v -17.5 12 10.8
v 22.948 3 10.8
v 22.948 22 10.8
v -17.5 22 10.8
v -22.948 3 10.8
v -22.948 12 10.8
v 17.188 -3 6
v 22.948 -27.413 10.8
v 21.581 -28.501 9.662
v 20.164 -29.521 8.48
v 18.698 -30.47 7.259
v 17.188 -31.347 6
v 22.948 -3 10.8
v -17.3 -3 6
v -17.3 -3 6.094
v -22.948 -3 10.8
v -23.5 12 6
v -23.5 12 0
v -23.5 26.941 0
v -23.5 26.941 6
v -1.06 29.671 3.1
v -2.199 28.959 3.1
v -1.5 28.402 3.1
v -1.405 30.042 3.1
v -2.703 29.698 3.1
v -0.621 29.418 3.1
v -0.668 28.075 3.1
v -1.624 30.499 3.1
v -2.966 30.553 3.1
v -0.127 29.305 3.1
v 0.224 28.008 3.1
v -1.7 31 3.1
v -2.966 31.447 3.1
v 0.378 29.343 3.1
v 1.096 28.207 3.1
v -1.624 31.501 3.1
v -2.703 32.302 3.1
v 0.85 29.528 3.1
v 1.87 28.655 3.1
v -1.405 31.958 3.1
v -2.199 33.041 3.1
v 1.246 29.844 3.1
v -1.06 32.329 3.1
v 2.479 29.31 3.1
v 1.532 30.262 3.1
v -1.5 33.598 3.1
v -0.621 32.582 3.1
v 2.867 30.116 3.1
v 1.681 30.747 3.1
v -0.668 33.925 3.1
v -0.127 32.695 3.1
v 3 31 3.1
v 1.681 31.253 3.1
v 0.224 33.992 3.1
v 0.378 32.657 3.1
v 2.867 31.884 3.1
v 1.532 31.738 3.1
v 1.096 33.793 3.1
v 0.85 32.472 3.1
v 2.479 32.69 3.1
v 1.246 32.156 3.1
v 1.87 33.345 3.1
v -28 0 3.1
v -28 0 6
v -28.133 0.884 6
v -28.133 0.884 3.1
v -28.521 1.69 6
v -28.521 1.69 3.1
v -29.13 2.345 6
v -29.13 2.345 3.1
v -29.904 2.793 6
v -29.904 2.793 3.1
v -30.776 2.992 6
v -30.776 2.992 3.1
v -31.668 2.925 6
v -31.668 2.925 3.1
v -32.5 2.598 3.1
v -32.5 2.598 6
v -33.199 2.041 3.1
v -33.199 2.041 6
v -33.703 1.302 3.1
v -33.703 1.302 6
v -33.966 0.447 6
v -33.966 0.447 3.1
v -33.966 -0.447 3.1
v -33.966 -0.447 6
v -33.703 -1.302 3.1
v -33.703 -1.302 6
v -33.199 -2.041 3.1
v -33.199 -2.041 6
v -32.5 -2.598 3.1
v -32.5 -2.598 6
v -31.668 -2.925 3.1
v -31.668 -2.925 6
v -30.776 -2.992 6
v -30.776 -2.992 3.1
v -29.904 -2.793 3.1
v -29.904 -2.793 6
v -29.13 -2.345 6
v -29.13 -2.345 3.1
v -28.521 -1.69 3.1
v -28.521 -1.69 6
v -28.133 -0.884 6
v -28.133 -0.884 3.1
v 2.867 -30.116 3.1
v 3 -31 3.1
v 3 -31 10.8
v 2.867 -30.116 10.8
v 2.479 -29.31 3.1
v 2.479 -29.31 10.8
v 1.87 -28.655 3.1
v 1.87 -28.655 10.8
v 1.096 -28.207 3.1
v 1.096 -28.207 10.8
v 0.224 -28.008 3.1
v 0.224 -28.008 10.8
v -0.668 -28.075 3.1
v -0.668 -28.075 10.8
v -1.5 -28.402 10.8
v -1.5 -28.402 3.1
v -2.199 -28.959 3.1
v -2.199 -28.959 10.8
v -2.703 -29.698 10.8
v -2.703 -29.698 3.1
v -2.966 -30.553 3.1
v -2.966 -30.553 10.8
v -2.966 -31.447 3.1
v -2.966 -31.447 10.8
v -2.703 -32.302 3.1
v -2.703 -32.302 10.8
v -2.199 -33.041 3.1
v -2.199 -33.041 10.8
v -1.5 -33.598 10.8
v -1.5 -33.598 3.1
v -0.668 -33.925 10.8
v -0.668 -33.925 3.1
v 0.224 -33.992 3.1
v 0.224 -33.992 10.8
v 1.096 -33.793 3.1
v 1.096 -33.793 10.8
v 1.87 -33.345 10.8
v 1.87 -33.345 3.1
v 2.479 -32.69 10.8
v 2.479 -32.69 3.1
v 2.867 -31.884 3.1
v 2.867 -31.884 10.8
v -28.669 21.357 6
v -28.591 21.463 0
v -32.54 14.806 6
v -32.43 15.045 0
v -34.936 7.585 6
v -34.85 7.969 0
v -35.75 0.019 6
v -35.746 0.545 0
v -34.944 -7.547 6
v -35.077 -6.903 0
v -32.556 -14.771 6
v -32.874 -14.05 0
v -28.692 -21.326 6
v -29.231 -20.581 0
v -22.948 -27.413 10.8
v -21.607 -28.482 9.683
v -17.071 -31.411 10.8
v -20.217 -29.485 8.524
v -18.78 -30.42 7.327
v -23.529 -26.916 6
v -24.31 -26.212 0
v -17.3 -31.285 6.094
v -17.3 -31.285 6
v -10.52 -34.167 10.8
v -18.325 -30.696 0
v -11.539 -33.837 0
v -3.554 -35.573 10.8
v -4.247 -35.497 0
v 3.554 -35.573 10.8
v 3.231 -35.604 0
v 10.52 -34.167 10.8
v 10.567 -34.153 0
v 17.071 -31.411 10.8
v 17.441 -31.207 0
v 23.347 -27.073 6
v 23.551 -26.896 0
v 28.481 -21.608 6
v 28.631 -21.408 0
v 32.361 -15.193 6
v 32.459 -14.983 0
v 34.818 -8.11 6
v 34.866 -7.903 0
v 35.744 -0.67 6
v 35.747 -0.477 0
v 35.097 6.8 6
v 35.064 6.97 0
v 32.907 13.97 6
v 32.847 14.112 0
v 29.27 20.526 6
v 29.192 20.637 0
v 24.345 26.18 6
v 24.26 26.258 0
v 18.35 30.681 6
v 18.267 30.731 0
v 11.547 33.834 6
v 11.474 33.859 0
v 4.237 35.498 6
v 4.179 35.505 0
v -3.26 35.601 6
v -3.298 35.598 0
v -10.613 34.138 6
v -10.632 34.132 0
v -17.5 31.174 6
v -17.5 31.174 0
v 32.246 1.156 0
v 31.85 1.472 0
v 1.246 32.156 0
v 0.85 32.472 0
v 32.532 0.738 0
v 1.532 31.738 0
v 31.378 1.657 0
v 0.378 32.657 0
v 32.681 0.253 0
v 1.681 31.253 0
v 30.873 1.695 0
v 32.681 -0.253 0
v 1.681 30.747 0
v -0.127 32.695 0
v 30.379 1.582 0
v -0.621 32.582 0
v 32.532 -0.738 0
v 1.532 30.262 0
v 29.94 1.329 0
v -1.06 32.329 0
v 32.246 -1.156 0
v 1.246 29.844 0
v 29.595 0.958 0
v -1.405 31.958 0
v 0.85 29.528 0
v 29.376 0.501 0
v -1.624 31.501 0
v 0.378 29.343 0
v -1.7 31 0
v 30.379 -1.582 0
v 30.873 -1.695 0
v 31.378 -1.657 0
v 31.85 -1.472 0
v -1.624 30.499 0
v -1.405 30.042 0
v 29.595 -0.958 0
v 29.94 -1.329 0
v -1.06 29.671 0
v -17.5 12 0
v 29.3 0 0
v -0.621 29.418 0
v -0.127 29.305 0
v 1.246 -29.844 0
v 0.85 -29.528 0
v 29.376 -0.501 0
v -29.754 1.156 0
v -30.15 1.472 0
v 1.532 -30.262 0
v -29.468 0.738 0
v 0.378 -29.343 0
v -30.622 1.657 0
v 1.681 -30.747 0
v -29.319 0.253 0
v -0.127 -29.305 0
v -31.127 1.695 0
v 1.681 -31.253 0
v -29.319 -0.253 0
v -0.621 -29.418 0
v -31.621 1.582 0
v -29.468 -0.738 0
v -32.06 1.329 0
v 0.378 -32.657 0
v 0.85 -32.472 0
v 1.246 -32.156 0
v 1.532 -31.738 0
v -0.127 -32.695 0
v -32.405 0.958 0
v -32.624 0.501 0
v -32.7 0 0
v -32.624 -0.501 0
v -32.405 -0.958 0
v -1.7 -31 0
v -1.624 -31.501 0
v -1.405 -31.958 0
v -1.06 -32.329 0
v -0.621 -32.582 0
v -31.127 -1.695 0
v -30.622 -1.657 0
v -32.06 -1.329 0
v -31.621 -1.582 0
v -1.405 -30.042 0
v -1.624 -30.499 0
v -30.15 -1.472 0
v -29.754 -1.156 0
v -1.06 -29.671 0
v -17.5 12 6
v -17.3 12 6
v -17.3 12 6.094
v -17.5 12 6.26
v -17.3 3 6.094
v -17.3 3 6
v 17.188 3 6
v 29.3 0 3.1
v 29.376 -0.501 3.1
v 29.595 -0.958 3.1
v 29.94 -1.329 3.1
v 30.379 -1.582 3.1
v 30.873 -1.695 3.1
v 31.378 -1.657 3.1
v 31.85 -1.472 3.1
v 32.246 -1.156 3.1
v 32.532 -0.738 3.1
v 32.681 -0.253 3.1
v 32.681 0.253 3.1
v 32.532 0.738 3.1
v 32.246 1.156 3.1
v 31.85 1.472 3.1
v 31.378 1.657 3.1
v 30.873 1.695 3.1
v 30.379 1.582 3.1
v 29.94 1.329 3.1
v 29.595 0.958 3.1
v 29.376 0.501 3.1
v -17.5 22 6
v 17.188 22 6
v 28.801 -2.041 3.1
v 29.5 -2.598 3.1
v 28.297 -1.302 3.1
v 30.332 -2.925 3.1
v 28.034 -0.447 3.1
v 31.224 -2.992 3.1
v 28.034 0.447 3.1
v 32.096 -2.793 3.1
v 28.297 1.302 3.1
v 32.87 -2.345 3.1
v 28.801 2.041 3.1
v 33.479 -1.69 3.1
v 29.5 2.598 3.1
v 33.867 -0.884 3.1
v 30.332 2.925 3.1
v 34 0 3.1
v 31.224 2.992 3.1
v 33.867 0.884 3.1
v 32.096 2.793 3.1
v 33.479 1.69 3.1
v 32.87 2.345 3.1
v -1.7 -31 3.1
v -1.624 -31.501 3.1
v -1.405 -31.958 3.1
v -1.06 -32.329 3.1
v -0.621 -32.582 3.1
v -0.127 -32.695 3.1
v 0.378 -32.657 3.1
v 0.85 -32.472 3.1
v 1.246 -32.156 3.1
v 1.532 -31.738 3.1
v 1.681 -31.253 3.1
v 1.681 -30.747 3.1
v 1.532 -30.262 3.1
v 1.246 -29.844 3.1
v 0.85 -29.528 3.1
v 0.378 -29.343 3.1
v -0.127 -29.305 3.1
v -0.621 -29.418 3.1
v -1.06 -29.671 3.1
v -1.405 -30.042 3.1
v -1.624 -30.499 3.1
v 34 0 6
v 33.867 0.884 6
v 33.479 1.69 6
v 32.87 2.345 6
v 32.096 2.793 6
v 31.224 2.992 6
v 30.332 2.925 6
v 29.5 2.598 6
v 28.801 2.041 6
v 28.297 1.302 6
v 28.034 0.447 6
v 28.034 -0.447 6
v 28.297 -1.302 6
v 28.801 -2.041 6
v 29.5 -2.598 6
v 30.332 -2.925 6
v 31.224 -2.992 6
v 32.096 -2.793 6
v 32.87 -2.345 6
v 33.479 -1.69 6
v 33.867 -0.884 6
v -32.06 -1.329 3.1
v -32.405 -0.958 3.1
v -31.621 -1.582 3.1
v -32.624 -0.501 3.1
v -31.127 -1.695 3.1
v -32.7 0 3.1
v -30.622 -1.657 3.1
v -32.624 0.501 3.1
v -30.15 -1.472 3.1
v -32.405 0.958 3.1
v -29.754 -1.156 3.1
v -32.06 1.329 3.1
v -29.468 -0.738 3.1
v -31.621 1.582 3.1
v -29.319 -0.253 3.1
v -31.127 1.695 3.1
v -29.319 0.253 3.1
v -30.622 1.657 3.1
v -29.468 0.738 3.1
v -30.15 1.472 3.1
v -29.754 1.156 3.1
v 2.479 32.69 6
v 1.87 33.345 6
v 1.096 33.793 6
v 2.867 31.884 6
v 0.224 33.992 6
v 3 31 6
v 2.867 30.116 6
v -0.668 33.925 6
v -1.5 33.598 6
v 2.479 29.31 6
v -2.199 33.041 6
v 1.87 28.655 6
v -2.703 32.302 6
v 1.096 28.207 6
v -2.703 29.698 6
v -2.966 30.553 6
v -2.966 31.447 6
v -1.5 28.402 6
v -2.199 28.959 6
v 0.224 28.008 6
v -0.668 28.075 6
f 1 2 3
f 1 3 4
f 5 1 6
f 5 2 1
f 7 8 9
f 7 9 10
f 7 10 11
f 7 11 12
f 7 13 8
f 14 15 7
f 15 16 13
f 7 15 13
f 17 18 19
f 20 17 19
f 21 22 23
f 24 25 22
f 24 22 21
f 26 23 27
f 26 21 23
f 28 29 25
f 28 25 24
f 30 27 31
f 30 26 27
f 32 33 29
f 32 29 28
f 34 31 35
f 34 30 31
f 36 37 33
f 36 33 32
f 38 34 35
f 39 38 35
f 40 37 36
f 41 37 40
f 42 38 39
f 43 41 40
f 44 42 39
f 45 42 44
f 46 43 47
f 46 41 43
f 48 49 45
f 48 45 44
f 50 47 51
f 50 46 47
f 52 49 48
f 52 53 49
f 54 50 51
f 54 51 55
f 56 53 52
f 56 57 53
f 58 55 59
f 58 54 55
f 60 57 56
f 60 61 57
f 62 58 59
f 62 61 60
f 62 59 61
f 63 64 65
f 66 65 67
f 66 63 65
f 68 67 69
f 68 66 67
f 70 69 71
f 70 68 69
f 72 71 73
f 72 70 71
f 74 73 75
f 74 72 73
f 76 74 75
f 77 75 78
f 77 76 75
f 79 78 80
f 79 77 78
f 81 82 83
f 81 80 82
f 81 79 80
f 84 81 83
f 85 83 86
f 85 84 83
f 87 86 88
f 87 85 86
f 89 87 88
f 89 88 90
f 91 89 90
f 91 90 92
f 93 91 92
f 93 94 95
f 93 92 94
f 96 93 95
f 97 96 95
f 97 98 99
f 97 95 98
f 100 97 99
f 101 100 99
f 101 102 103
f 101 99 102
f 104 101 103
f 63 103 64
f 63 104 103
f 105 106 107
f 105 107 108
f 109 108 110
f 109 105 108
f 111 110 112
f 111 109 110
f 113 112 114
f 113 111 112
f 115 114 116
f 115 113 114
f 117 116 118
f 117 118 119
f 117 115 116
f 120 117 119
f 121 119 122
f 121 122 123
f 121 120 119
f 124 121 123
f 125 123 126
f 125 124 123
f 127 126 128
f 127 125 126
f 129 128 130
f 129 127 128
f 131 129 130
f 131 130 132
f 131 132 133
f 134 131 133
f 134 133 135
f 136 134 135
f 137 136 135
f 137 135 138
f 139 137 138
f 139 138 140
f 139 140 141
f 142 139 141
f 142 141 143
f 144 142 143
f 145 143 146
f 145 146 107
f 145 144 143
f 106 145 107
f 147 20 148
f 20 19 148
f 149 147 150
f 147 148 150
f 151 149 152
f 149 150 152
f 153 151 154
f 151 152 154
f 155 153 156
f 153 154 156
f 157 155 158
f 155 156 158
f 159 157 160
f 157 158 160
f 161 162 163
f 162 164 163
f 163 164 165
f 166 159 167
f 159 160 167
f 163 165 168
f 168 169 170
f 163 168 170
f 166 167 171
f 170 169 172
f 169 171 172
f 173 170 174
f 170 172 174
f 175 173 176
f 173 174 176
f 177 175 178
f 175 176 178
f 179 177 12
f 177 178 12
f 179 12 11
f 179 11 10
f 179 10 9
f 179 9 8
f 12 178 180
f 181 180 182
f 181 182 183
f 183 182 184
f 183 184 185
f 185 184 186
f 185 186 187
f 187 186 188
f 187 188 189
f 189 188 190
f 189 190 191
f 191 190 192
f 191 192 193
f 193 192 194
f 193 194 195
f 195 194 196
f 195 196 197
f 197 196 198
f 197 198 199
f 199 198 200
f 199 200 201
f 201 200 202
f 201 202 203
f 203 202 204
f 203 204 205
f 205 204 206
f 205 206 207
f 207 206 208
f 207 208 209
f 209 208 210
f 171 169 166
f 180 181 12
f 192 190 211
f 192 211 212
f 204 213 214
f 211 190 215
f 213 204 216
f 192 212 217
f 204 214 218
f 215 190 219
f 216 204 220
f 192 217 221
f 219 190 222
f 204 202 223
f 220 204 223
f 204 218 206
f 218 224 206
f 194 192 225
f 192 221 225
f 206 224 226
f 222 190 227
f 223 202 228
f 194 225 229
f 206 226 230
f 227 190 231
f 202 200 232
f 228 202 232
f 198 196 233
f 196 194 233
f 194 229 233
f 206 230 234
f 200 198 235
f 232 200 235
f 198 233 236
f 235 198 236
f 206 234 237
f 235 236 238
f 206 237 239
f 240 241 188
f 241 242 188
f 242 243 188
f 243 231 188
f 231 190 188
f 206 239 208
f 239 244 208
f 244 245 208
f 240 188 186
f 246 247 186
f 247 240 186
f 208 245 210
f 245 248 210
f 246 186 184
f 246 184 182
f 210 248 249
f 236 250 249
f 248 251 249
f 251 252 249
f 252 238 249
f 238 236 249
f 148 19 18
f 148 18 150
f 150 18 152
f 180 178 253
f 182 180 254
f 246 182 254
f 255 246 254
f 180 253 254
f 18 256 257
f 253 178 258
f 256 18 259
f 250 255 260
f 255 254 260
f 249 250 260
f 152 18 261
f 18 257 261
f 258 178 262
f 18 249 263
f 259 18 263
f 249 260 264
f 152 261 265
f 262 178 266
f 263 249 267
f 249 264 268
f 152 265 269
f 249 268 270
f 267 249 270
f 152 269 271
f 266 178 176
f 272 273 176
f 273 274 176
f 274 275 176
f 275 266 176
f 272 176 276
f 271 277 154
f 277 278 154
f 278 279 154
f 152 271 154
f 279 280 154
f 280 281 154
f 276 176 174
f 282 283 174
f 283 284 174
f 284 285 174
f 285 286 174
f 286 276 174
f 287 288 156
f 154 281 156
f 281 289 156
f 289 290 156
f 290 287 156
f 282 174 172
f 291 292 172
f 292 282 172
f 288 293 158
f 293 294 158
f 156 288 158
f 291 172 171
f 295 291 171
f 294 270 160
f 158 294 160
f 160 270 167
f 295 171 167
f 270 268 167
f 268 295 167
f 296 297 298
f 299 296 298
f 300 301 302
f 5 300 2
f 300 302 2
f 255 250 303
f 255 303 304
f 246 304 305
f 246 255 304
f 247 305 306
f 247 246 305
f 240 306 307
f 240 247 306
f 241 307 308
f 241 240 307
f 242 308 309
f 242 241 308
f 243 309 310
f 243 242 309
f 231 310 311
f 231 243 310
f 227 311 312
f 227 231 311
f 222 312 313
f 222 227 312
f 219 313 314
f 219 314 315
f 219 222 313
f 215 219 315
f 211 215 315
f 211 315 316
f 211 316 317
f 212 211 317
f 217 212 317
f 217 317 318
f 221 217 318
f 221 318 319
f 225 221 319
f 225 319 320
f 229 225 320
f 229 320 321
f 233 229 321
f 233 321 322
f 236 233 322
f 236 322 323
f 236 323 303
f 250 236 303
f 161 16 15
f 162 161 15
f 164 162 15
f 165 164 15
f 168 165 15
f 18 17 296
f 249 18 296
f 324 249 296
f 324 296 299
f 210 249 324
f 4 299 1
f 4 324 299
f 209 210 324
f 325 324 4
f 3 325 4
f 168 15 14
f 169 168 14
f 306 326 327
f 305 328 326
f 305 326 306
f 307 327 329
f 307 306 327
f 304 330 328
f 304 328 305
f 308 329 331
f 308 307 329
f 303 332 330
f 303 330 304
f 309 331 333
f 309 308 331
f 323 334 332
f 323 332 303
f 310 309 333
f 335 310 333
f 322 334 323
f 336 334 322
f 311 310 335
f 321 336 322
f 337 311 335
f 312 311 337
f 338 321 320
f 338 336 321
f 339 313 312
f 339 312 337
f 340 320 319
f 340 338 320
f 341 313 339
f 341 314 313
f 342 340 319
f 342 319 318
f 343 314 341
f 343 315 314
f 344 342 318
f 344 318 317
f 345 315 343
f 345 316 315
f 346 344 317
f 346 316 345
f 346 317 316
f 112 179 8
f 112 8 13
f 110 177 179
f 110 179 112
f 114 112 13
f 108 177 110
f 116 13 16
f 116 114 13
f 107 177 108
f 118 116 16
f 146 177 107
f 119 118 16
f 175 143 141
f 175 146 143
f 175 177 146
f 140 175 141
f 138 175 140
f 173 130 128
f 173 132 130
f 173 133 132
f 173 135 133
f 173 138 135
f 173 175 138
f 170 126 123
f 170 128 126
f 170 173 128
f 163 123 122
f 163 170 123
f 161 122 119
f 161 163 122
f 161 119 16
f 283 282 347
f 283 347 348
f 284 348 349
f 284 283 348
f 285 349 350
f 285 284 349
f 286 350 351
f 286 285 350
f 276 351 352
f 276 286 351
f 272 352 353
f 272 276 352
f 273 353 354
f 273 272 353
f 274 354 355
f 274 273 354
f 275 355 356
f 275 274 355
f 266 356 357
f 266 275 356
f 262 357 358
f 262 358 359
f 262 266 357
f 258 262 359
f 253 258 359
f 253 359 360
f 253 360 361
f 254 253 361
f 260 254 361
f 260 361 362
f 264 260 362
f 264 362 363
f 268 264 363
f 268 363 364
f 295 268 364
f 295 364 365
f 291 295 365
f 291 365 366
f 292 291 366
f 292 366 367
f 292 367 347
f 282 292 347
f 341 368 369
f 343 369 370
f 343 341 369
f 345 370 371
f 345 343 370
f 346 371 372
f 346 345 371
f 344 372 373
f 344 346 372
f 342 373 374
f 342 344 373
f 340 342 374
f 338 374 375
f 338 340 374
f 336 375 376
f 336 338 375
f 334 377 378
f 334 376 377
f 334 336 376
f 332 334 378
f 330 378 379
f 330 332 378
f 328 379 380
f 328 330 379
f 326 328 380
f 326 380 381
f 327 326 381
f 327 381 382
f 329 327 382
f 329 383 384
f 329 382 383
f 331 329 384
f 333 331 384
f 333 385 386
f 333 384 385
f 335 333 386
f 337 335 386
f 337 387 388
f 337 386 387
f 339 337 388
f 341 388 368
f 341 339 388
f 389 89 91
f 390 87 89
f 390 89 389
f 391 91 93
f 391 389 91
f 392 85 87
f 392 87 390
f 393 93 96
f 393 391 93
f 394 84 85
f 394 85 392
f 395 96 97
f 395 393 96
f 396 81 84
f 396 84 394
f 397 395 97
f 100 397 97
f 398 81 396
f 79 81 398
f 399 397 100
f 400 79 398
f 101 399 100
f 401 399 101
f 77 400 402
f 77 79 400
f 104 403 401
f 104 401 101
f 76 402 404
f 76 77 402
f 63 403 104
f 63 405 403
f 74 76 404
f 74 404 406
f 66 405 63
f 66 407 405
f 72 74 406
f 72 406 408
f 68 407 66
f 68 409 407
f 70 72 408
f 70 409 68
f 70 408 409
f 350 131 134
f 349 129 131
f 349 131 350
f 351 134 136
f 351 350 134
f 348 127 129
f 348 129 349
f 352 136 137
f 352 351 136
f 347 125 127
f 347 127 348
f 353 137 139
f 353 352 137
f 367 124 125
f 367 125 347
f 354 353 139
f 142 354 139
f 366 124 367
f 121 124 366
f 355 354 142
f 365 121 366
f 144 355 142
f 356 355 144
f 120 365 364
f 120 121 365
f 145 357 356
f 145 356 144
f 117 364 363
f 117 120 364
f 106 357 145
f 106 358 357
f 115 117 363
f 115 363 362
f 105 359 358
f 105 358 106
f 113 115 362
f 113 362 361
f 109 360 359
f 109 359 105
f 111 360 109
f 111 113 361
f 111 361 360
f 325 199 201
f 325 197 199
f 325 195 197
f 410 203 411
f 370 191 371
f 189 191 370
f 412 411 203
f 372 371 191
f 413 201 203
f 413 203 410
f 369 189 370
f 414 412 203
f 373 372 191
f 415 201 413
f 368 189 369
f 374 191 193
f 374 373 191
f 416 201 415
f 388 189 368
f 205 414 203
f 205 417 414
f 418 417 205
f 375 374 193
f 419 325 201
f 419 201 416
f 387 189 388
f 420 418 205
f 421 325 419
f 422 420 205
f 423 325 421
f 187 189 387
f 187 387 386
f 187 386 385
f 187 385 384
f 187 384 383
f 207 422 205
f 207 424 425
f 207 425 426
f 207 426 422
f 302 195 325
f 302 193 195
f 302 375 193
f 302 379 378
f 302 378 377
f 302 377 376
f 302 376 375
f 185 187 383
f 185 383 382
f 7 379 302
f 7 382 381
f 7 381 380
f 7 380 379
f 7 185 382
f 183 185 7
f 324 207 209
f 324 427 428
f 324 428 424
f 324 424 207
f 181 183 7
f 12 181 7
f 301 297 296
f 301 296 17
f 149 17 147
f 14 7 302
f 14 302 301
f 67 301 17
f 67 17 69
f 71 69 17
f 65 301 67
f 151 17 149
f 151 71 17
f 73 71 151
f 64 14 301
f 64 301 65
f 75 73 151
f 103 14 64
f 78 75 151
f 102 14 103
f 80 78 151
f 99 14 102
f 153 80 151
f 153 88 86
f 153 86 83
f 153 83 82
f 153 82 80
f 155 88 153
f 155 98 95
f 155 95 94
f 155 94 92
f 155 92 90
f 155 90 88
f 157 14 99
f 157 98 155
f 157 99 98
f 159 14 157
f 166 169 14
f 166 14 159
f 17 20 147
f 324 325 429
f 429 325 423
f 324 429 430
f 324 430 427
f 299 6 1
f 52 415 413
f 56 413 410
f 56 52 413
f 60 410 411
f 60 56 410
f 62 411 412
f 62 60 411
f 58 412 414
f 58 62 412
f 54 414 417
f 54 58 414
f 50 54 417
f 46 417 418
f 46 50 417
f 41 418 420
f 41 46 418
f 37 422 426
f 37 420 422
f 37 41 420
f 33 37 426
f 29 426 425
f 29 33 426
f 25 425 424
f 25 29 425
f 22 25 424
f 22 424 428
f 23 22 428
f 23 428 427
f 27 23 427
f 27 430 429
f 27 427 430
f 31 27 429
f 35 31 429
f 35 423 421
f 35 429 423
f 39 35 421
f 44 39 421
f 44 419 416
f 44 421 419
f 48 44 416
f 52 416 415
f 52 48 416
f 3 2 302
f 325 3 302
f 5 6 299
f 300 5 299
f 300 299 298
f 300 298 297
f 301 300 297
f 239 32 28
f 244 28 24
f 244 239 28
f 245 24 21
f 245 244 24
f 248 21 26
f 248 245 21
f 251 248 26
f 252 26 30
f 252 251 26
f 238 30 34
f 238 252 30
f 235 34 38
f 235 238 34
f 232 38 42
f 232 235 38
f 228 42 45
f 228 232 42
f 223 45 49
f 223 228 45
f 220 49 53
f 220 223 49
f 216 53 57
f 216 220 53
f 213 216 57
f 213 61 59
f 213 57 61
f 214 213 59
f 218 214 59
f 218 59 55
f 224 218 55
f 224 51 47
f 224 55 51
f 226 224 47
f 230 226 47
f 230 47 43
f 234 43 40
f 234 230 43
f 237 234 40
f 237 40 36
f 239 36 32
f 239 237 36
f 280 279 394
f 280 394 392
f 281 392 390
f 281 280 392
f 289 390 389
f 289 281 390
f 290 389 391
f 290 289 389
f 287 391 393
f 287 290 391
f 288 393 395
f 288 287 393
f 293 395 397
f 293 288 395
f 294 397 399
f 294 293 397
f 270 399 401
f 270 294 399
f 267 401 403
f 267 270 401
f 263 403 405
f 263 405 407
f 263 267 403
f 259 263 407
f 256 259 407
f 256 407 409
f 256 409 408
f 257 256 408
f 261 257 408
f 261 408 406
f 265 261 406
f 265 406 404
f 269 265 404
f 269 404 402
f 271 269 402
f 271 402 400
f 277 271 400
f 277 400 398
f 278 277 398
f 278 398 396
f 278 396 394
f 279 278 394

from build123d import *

# Parameters (mm, degrees)
SKETCH1_R                      = 35.75
SKETCH1_R_2                    = 1.7
BOSS_EXTRUDE1_DEPTH            = 10.8
CUT_EXTRUDE1_START             = -7.7
SKETCH2_R                      = 3
SKETCH2_R_2                    = 1.7
CUT_EXTRUDE1_DEPTH             = 7.7
SKETCH3_W                      = 6
SKETCH3_H                      = 10
CUT_EXTRUDE2_DEPTH             = 52.698791088
CUT_EXTRUDE3_DEPTH             = 52.698791088
CUT_EXTRUDE3_DIRECTION_2_REACH = 53.699
BOSS_EXTRUDE2_DEPTH            = 7.7
CUT_EXTRUDE4_DEPTH             = 66.040487391
CUT_EXTRUDE4_DEPTH_BACK        = 66.040487391
SKETCH6_W                      = 4.8
SKETCH6_H                      = 17.274998913
CUT_EXTRUDE5_DEPTH             = 66.040487391
CUT_EXTRUDE5_DEPTH_BACK        = 66.040487391
SKETCH8_W                      = 6
SKETCH8_H                      = 23.025515334
CUT_EXTRUDE6_DEPTH             = 10


with BuildPart() as part:
    # Sketch1 → Boss-Extrude1 (new body)
    with BuildSketch(Plane.XY):
        with Locations(Location((0, 0, 0), (0, 0, 180))):
            Circle(SKETCH1_R)
        with Locations(Location((0, 31, 0), (0, 0, 180))):
            Circle(SKETCH1_R_2, mode=Mode.SUBTRACT)
        with Locations(Location((31, 0, 0), (0, 0, 180))):
            Circle(SKETCH1_R_2, mode=Mode.SUBTRACT)
        with Locations(Location((0, -31, 0), (0, 0, 180))):
            Circle(SKETCH1_R_2, mode=Mode.SUBTRACT)
        with Locations(Location((-31, 0, 0), (0, 0, 180))):
            Circle(SKETCH1_R_2, mode=Mode.SUBTRACT)
    extrude(amount=BOSS_EXTRUDE1_DEPTH)

    # Sketch2 → Cut-Extrude1 (cut)
    # profile 1 of 4: a face of its own
    with BuildSketch(Plane.XY.offset(10.8).offset(CUT_EXTRUDE1_START)):
        with Locations((-31, 0)):
            Circle(SKETCH2_R)
        with Locations(Location((-31, 0, 0), (0, 0, 180))):
            Circle(SKETCH2_R_2, mode=Mode.SUBTRACT)
    # profile 2 of 4: a face of its own
    with BuildSketch(Plane.XY.offset(10.8).offset(CUT_EXTRUDE1_START)):
        with Locations((31, 0)):
            Circle(SKETCH2_R)
        with Locations(Location((31, 0, 0), (0, 0, 180))):
            Circle(SKETCH2_R_2, mode=Mode.SUBTRACT)
    # profile 3 of 4: a face of its own
    with BuildSketch(Plane.XY.offset(10.8).offset(CUT_EXTRUDE1_START)):
        with Locations((0, -31)):
            Circle(SKETCH2_R)
        with Locations(Location((0, -31, 0), (0, 0, 180))):
            Circle(SKETCH2_R_2, mode=Mode.SUBTRACT)
    # profile 4 of 4: a face of its own
    with BuildSketch(Plane.XY.offset(10.8).offset(CUT_EXTRUDE1_START)):
        with Locations((0, 31)):
            Circle(SKETCH2_R)
    extrude(amount=CUT_EXTRUDE1_DEPTH, mode=Mode.SUBTRACT)

    # Sketch3 → Cut-Extrude2 (cut, through all)
    with BuildSketch(Plane.XY.offset(10.8)):
        with Locations((-20.5, 17)):
            Rectangle(SKETCH3_W, SKETCH3_H)
    extrude(amount=-CUT_EXTRUDE2_DEPTH, mode=Mode.SUBTRACT)

    # Sketch4 → Cut-Extrude3 (cut)
    with BuildSketch(Plane(origin=(0, 0, 0), x_dir=(1, 0, 0), z_dir=(0, 1, 0))):
        Polygon((35.75, -6), (17.3, -6), (23.06, -10.8), (35.75, -10.8), align=None)
        Polygon((23.06, -10.8), (22.947590013, -10.8), (17.187590013, -6), (17.3, -6), align=None)
        Polygon((-23.26, -10.8), (-17.5, -6), (-35.75, -6), (-35.75, -10.8), align=None)
        Polygon((-23.06, -10.8), (-17.3, -6), (-17.5, -6), (-23.26, -10.8), align=None)
        Polygon((-17.3, -6.093674989), (-17.3, -6), (-23.06, -10.8), (-22.947590013, -10.8), align=None)
    extrude(amount=-CUT_EXTRUDE3_DEPTH, mode=Mode.SUBTRACT)

    # Cut-Extrude3 direction 2: up to this face of the body (flat: up to its plane)
    cut_extrude3_direction_2_end = Plane(part.part.faces().sort_by_distance((-20.5, 22, 5.4))[0])
    # Sketch4 → Cut-Extrude3 direction 2 (cut, up to the picked face)
    with BuildSketch(Plane(origin=(0, 0, 0), x_dir=(1, 0, 0), z_dir=(0, 1, 0)), mode=Mode.PRIVATE) as cut_extrude3_direction_2_sk1:
        Polygon((35.75, -6), (17.3, -6), (23.06, -10.8), (35.75, -10.8), align=None)
    cut_extrude3_direction_2_tool1 = split(extrude(cut_extrude3_direction_2_sk1.sketch, amount=CUT_EXTRUDE3_DIRECTION_2_REACH, mode=Mode.PRIVATE), bisect_by=cut_extrude3_direction_2_end, keep=Keep.BOTH, mode=Mode.PRIVATE)
    # Sketch4 → Cut-Extrude3 direction 2 (cut, up to the picked face)
    with BuildSketch(Plane(origin=(0, 0, 0), x_dir=(1, 0, 0), z_dir=(0, 1, 0)), mode=Mode.PRIVATE) as cut_extrude3_direction_2_sk2:
        Polygon((23.06, -10.8), (22.947590013, -10.8), (17.187590013, -6), (17.3, -6), align=None)
    cut_extrude3_direction_2_tool2 = split(extrude(cut_extrude3_direction_2_sk2.sketch, amount=CUT_EXTRUDE3_DIRECTION_2_REACH, mode=Mode.PRIVATE), bisect_by=cut_extrude3_direction_2_end, keep=Keep.BOTH, mode=Mode.PRIVATE)
    # Sketch4 → Cut-Extrude3 direction 2 (cut, up to the picked face)
    with BuildSketch(Plane(origin=(0, 0, 0), x_dir=(1, 0, 0), z_dir=(0, 1, 0)), mode=Mode.PRIVATE) as cut_extrude3_direction_2_sk3:
        Polygon((-23.26, -10.8), (-17.5, -6), (-35.75, -6), (-35.75, -10.8), align=None)
    cut_extrude3_direction_2_tool3 = split(extrude(cut_extrude3_direction_2_sk3.sketch, amount=CUT_EXTRUDE3_DIRECTION_2_REACH, mode=Mode.PRIVATE), bisect_by=cut_extrude3_direction_2_end, keep=Keep.BOTH, mode=Mode.PRIVATE)
    # Sketch4 → Cut-Extrude3 direction 2 (cut, up to the picked face)
    with BuildSketch(Plane(origin=(0, 0, 0), x_dir=(1, 0, 0), z_dir=(0, 1, 0)), mode=Mode.PRIVATE) as cut_extrude3_direction_2_sk4:
        Polygon((-23.06, -10.8), (-17.3, -6), (-17.5, -6), (-23.26, -10.8), align=None)
    cut_extrude3_direction_2_tool4 = split(extrude(cut_extrude3_direction_2_sk4.sketch, amount=CUT_EXTRUDE3_DIRECTION_2_REACH, mode=Mode.PRIVATE), bisect_by=cut_extrude3_direction_2_end, keep=Keep.BOTH, mode=Mode.PRIVATE)
    # Sketch4 → Cut-Extrude3 direction 2 (cut, up to the picked face)
    with BuildSketch(Plane(origin=(0, 0, 0), x_dir=(1, 0, 0), z_dir=(0, 1, 0)), mode=Mode.PRIVATE) as cut_extrude3_direction_2_sk5:
        Polygon((-17.3, -6.093674989), (-17.3, -6), (-23.06, -10.8), (-22.947590013, -10.8), align=None)
    cut_extrude3_direction_2_tool5 = split(extrude(cut_extrude3_direction_2_sk5.sketch, amount=CUT_EXTRUDE3_DIRECTION_2_REACH, mode=Mode.PRIVATE), bisect_by=cut_extrude3_direction_2_end, keep=Keep.BOTH, mode=Mode.PRIVATE)
    add(cut_extrude3_direction_2_tool1.solids().sort_by(Axis((27.876214, 0, 8.252023), (0, 1, 0)))[0], mode=Mode.SUBTRACT)
    add(cut_extrude3_direction_2_tool2.solids().sort_by(Axis((20.123795, 0, 8.4), (0, 1, 0)))[0], mode=Mode.SUBTRACT)
    add(cut_extrude3_direction_2_tool3.solids().sort_by(Axis((-27.975059, 0, 8.250098), (0, 1, 0)))[0], mode=Mode.SUBTRACT)
    add(cut_extrude3_direction_2_tool4.solids().sort_by(Axis((-20.28, 0, 8.4), (0, 1, 0)))[0], mode=Mode.SUBTRACT)
    add(cut_extrude3_direction_2_tool5.solids().sort_by(Axis((-20.15199, 0, 8.423342), (0, 1, 0)))[0], mode=Mode.SUBTRACT)

    # Sketch5 → Boss-Extrude2 (add)
    with BuildSketch(Plane.ZY.offset(17.5)):
        Polygon((6.260341656, 22), (6.166666667, 22), (6, 22), (6, 12), (6.260341656, 12), align=None)
    extrude(amount=-BOSS_EXTRUDE2_DEPTH)

    # Sketch6 → Cut-Extrude4 (cut, two sides: drawn at the far end of the back side and taken through both)
    with BuildSketch(Plane.ZY.offset(17.5).offset(-CUT_EXTRUDE4_DEPTH_BACK)):
        with Locations((8.4, 30.637499457)):
            Rectangle(SKETCH6_W, SKETCH6_H)
    extrude(amount=CUT_EXTRUDE4_DEPTH + CUT_EXTRUDE4_DEPTH_BACK, mode=Mode.SUBTRACT)

    # Sketch7 → Cut-Extrude5 (cut, two sides: drawn at the far end of the back side and taken through both)
    with BuildSketch(Plane.ZY.offset(17.5).offset(-CUT_EXTRUDE5_DEPTH_BACK)):
        Polygon((6, -3), (6, 0), (6, 3), (10.8, 3), (10.8, -3), align=None)
    extrude(amount=CUT_EXTRUDE5_DEPTH + CUT_EXTRUDE5_DEPTH_BACK, mode=Mode.SUBTRACT)

    # Sketch8 → Cut-Extrude6 (cut)
    with BuildSketch(Plane(origin=(0, 0, 0), x_dir=(-1, 0, 0), z_dir=(0, 0, -1))):
        with Locations((20.5, 23.512757667)):
            Rectangle(SKETCH8_W, SKETCH8_H)
    extrude(amount=-CUT_EXTRUDE6_DEPTH, mode=Mode.SUBTRACT)


solid = part.part
